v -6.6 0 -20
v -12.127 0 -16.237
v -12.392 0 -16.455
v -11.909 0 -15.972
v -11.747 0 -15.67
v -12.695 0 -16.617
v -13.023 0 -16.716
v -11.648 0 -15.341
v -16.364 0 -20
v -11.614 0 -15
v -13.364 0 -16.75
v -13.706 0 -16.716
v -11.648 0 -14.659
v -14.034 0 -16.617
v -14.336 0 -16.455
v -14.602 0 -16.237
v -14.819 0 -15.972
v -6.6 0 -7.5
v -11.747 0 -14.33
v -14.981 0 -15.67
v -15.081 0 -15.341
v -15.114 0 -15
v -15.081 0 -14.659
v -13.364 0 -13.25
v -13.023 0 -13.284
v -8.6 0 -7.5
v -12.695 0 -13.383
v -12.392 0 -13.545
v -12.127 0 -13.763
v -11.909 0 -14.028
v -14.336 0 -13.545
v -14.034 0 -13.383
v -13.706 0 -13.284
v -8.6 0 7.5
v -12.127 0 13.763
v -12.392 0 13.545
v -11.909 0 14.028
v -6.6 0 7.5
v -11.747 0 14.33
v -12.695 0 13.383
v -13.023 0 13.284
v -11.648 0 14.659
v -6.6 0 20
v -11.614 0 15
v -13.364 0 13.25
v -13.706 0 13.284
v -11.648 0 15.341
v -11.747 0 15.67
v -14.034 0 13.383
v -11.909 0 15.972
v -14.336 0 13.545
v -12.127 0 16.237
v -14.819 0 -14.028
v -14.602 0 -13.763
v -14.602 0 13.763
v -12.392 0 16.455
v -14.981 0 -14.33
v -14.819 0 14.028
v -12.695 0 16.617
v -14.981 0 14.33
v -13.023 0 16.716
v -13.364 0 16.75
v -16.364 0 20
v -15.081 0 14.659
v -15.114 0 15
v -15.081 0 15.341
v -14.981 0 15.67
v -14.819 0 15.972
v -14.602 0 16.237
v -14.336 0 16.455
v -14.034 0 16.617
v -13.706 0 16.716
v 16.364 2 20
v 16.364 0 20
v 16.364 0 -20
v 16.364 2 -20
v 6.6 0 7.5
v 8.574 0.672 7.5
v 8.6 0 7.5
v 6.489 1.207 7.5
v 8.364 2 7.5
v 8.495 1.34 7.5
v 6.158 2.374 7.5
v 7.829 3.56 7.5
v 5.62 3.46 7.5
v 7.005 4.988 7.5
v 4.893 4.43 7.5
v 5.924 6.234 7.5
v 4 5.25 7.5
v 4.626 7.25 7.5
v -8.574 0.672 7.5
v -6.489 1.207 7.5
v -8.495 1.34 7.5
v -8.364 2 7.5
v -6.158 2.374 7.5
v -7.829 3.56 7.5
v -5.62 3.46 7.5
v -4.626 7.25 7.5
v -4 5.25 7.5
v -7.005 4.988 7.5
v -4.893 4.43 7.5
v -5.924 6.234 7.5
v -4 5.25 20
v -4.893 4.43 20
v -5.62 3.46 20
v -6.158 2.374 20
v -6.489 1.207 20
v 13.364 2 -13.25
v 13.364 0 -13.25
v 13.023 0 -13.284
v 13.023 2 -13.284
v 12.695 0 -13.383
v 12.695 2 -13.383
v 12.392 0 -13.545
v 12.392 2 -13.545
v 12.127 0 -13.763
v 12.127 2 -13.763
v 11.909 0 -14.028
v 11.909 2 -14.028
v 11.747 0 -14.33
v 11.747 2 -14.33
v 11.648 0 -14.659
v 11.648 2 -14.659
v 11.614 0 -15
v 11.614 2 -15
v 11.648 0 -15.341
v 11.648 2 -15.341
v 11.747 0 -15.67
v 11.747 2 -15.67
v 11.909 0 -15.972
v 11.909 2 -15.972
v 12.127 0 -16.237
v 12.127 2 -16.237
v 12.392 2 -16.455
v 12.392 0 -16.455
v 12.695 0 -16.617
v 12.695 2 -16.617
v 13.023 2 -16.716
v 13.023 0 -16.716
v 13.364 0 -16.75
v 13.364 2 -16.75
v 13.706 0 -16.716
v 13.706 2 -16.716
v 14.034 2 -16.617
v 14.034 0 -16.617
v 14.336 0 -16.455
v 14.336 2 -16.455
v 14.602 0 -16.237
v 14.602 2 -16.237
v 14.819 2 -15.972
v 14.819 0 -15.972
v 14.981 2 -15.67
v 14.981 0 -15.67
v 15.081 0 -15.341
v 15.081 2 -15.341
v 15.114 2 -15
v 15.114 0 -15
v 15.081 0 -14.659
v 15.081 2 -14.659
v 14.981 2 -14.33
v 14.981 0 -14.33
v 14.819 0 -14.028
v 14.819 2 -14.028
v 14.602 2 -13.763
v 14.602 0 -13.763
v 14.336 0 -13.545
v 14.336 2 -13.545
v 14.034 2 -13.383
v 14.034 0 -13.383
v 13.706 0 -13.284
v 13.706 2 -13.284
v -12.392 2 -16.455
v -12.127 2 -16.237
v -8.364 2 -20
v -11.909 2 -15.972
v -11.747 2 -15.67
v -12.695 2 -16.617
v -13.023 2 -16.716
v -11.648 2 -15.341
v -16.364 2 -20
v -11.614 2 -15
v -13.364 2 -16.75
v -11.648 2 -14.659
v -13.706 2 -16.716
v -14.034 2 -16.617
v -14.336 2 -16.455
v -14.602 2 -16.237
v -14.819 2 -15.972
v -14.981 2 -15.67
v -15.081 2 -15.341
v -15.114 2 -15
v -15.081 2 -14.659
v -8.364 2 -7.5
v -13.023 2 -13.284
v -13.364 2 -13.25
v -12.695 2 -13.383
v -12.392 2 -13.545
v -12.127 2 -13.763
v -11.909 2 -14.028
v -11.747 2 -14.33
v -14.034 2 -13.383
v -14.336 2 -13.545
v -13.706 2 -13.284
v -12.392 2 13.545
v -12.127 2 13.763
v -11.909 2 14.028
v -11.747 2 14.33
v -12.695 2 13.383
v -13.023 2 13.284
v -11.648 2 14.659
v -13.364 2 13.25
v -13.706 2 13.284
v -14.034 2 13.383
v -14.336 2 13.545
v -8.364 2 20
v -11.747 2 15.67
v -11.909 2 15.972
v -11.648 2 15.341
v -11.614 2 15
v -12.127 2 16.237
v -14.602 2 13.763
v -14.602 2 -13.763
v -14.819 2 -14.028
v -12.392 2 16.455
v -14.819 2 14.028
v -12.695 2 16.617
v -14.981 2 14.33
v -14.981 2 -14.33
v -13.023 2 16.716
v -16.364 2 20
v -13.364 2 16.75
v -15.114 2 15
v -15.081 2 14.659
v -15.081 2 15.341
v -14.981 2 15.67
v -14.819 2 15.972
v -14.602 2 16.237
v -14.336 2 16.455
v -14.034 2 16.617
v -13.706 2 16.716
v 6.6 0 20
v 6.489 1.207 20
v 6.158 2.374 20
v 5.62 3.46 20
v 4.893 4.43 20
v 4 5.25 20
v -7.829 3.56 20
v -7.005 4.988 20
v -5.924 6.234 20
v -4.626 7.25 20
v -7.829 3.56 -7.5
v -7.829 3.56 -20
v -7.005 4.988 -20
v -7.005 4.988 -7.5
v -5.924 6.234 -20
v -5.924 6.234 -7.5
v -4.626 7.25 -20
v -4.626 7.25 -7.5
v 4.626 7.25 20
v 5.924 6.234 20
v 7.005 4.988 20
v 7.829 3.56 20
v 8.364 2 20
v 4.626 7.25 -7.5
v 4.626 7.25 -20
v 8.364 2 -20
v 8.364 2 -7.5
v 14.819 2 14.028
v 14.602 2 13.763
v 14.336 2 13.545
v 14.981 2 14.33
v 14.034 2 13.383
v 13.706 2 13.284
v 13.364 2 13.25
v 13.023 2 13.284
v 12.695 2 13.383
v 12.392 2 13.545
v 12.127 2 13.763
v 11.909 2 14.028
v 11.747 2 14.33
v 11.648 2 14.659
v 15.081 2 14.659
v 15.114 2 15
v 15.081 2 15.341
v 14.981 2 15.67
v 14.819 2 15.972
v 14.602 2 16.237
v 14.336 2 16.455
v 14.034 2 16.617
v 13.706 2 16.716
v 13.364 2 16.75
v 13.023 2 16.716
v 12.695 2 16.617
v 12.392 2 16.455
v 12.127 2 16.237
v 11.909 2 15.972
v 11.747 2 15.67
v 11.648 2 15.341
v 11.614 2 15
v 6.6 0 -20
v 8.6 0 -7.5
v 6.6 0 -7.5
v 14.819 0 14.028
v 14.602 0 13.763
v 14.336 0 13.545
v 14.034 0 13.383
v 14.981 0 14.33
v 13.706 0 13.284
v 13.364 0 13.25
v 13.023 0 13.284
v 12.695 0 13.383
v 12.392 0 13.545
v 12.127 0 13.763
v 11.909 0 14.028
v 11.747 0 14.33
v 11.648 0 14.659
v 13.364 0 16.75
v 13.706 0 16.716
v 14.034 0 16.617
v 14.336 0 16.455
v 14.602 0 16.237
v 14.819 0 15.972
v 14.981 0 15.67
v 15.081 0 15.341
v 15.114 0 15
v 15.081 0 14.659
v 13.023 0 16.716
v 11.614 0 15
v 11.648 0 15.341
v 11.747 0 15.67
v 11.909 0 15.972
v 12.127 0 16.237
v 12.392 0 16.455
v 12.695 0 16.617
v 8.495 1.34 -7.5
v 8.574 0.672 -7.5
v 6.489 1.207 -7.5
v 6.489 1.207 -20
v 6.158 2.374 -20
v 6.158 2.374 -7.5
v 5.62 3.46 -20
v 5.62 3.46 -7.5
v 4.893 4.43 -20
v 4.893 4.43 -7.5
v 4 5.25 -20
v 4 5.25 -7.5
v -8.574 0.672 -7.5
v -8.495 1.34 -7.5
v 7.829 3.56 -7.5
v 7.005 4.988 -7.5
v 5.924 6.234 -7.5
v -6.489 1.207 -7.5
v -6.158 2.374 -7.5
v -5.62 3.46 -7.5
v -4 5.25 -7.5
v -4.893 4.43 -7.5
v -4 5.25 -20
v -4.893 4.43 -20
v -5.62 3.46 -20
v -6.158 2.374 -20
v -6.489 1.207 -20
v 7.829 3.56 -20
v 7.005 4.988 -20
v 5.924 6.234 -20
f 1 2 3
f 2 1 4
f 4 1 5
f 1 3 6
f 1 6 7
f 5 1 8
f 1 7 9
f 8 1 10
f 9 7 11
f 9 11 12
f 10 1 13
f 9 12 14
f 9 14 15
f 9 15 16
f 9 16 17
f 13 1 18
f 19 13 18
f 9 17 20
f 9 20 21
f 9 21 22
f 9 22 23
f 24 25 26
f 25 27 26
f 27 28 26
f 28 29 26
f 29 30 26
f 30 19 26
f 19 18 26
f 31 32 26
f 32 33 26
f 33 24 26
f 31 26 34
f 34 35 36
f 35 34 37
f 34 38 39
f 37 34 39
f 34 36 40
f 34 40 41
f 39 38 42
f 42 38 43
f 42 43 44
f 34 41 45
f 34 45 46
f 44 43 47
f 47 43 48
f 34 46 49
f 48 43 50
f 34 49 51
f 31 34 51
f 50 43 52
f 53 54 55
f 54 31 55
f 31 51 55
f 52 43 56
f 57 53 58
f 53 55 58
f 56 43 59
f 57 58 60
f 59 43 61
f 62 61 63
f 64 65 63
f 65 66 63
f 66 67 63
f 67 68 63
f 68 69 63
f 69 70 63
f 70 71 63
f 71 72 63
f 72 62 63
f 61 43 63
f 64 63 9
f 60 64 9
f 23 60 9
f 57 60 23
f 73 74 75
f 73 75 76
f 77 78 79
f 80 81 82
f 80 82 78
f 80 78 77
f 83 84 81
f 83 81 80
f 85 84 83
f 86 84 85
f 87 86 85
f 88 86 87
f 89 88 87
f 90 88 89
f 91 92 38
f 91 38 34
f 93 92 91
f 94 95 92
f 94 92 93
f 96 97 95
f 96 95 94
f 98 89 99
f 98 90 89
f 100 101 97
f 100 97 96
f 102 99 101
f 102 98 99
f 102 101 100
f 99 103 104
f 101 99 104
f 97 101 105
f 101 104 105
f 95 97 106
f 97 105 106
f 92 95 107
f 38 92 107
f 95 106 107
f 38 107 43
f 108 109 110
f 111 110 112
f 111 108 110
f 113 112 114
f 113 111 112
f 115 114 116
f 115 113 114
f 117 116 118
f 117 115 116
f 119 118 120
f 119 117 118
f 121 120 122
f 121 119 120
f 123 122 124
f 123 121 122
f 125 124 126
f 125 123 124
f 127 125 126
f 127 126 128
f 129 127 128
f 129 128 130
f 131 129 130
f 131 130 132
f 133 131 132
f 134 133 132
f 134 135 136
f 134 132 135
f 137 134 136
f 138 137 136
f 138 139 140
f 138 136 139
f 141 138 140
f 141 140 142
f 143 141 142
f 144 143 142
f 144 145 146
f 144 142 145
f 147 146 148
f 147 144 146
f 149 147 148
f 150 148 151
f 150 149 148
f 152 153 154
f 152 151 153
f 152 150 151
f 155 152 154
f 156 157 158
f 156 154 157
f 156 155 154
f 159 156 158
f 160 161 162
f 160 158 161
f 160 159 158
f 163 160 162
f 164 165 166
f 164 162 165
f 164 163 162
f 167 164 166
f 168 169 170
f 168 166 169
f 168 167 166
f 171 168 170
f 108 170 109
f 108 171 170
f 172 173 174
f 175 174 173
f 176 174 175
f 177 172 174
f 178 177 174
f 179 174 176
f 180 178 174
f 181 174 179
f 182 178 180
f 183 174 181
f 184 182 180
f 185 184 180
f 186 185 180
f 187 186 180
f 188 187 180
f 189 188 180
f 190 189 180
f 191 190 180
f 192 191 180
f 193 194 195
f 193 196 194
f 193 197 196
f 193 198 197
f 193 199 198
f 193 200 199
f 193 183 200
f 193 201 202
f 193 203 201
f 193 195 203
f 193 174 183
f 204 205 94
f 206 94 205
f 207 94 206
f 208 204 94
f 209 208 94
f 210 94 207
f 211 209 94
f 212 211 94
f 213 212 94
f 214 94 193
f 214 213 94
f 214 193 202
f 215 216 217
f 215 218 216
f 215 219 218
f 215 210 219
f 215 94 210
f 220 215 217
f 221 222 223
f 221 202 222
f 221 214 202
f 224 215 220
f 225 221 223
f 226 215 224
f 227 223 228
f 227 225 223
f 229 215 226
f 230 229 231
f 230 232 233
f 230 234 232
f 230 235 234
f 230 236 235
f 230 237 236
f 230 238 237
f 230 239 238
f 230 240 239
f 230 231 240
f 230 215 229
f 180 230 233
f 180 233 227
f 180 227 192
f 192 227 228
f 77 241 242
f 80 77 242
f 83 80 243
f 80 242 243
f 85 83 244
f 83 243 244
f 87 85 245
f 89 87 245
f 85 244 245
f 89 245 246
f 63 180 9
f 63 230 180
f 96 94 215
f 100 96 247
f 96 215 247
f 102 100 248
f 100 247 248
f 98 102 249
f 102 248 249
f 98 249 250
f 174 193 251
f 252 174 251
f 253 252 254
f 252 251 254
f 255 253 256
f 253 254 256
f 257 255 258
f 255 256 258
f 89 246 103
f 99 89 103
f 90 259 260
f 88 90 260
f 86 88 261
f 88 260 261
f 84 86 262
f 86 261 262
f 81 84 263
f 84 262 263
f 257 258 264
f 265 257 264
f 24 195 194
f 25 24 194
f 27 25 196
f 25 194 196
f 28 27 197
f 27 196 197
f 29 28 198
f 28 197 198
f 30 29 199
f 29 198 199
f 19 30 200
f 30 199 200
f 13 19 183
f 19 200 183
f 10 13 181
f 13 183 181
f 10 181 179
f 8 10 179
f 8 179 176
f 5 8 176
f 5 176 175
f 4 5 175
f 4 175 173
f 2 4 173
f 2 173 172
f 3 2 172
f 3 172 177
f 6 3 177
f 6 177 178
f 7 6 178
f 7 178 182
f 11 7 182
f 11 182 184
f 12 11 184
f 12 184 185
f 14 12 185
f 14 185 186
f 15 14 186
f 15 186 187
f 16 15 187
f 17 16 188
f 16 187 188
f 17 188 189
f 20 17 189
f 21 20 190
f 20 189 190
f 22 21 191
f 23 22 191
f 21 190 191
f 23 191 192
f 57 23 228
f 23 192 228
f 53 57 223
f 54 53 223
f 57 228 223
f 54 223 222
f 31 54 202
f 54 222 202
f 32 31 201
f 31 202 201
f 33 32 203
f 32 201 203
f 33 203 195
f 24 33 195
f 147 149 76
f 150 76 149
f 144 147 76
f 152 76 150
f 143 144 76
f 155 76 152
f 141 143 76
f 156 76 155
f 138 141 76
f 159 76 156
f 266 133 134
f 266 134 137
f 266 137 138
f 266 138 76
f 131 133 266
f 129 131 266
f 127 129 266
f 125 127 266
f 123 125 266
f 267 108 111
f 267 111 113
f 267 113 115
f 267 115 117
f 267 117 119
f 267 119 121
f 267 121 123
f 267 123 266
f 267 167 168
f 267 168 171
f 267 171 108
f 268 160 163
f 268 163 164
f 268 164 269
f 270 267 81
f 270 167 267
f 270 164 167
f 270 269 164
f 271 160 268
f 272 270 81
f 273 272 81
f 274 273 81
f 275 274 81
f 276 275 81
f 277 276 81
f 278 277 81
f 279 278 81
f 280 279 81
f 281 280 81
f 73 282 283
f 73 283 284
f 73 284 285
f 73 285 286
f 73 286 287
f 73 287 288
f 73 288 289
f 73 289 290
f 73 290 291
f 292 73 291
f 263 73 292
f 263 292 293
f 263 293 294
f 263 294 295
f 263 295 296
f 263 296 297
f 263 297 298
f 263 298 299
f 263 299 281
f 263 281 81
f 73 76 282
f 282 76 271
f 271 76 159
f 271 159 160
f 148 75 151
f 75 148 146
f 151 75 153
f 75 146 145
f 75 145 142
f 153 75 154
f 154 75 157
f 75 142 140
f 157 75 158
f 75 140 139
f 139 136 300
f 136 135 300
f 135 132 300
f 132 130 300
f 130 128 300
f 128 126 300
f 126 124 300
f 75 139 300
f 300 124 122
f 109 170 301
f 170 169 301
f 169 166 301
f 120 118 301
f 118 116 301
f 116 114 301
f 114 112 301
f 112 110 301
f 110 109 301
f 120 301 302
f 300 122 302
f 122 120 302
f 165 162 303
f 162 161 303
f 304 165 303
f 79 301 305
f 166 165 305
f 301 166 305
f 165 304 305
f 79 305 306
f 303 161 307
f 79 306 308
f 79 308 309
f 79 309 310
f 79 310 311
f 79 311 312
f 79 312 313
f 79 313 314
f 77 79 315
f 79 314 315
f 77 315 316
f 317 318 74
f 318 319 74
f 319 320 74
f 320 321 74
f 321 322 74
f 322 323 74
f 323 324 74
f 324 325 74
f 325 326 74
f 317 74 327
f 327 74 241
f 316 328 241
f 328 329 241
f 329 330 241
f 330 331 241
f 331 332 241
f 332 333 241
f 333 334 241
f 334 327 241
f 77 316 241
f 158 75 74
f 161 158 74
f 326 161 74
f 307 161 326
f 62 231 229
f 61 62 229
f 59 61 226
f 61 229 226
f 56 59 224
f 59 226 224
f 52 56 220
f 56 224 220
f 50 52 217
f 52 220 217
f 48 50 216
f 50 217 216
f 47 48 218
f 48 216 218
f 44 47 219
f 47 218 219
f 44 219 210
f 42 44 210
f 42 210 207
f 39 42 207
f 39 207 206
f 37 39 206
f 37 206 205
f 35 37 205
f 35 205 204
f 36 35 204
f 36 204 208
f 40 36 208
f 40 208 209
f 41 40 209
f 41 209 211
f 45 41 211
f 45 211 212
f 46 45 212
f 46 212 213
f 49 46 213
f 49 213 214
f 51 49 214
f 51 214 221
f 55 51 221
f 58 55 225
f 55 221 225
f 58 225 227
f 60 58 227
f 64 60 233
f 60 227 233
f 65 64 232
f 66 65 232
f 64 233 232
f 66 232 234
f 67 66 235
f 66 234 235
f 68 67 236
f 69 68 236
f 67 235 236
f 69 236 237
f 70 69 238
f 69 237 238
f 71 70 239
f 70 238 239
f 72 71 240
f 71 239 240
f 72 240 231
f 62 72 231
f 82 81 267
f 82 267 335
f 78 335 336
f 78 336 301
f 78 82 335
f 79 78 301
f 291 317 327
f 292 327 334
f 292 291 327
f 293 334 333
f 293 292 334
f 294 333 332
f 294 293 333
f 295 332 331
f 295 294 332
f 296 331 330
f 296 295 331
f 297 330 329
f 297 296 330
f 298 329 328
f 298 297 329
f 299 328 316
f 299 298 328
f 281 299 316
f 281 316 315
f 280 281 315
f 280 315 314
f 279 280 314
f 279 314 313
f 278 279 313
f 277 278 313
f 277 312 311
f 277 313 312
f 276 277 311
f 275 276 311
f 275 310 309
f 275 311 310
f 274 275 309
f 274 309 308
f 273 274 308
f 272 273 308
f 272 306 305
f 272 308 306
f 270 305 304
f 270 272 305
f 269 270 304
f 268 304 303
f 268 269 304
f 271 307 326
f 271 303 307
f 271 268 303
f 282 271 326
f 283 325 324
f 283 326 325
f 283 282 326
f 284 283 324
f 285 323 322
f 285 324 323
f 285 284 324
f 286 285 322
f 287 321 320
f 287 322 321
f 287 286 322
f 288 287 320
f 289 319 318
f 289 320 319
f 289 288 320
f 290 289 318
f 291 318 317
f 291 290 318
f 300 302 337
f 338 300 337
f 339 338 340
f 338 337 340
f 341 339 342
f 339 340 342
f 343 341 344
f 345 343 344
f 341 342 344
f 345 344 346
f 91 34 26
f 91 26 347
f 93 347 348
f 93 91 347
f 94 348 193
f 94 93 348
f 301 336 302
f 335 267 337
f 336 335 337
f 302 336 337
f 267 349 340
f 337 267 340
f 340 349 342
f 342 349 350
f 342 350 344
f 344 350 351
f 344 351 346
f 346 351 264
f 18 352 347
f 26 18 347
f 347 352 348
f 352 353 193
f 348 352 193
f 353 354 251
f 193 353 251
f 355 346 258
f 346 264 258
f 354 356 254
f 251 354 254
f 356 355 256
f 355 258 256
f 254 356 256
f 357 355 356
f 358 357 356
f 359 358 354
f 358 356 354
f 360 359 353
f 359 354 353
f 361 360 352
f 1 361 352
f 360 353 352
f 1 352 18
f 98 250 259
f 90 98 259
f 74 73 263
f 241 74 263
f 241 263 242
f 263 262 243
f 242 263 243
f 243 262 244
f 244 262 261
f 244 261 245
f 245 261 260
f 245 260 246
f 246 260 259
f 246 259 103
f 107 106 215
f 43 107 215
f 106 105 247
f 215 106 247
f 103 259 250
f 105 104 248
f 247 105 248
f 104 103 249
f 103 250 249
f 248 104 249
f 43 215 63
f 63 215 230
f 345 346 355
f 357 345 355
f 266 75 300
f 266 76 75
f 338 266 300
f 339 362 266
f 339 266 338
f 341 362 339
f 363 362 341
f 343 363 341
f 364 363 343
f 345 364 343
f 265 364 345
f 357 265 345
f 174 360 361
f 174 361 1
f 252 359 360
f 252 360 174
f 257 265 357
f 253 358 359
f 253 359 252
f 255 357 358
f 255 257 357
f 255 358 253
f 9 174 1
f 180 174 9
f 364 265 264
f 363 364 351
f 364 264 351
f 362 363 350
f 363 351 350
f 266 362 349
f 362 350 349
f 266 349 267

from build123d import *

# Parameters (mm, degrees)
BOSS_EXTRUDE1_DEPTH   = 20
BOSS_EXTRUDE1_2_DEPTH = 20
BOSS_EXTRUDE2_DEPTH   = 20
CUT_EXTRUDE1_DEPTH    = 7.5
SKETCH3_R             = 1.75
CUT_EXTRUDE2_DEPTH    = 27.369487129


with BuildPart() as part:
    # Sketch2 → Boss-Extrude1 (new, symmetric)
    with BuildSketch(Plane.XY):
        with BuildLine():
            Line((-16.364209467, 0), (-8.6, 0))
            ThreePointArc((-8.6, 0), (-8.540848945, 1.006925665), (-8.364209467, 2))
            Line((-8.364209467, 2), (-16.364209467, 2))
            Line((-16.364209467, 2), (-16.364209467, 0))
        make_face()
    extrude(amount=BOSS_EXTRUDE1_DEPTH, both=True)



with BuildPart() as body_2:
    # Sketch2 → Boss-Extrude1 2 (new, symmetric)
    with BuildSketch(Plane.XY):
        with BuildLine():
            ThreePointArc((8.364209467, 2), (8.540848945, 1.006925665), (8.6, 0))
            Line((8.6, 0), (16.364209467, 0))
            Line((16.364209467, 0), (16.364209467, 2))
            Line((16.364209467, 2), (8.364209467, 2))
        make_face()
    extrude(amount=BOSS_EXTRUDE1_2_DEPTH, both=True)


with BuildPart() as part_1:
    add(part.part)

    add(body_2.part)  # Boss-Extrude2 merges body 2
    # Sketch2<4> → Boss-Extrude2 (add, symmetric)
    with BuildSketch(Plane.XY):
        with BuildLine():
            Line((-8.6, 0), (-6.6, 0))
            ThreePointArc((-6.6, 0), (-5.914302048, 2.929339736), (-3.999687488, 5.25))
            Line((-3.999687488, 5.25), (3.999687488, 5.25))
            ThreePointArc((3.999687488, 5.25), (5.914302048, 2.929339736), (6.6, 0))
            Line((6.6, 0), (8.6, 0))
            ThreePointArc((8.6, 0), (8.540848945, 1.006925665), (8.364209467, 2))
            ThreePointArc((8.364209467, 2), (7.005379537, 4.988452419), (4.625743184, 7.25))
            Line((4.625743184, 7.25), (-4.625743184, 7.25))
            ThreePointArc((-4.625743184, 7.25), (-7.005379537, 4.988452419), (-8.364209467, 2))
            ThreePointArc((-8.364209467, 2), (-8.540848945, 1.006925665), (-8.6, 0))
        make_face()
    extrude(amount=BOSS_EXTRUDE2_DEPTH, both=True)

    # Sketch2<5> → Cut-Extrude1 (cut, symmetric)
    with BuildSketch(Plane.XY):
        with BuildLine():
            Line((-8.6, 0), (-6.6, 0))
            ThreePointArc((-6.6, 0), (-5.914302048, 2.929339736), (-3.999687488, 5.25))
            Line((-3.999687488, 5.25), (3.999687488, 5.25))
            ThreePointArc((3.999687488, 5.25), (5.914302048, 2.929339736), (6.6, 0))
            Line((6.6, 0), (8.6, 0))
            ThreePointArc((8.6, 0), (8.540848945, 1.006925665), (8.364209467, 2))
            ThreePointArc((8.364209467, 2), (7.005379537, 4.988452419), (4.625743184, 7.25))
            Line((4.625743184, 7.25), (-4.625743184, 7.25))
            ThreePointArc((-4.625743184, 7.25), (-7.005379537, 4.988452419), (-8.364209467, 2))
            ThreePointArc((-8.364209467, 2), (-8.540848945, 1.006925665), (-8.6, 0))
        make_face()
    extrude(amount=CUT_EXTRUDE1_DEPTH, both=True, mode=Mode.SUBTRACT)

    # Sketch3 → Cut-Extrude2 (cut, through all)
    with BuildSketch(Plane(origin=(0, 2, 0), x_dir=(1, 0, 0), z_dir=(0, 1, 0))):
        with Locations((-13.364209467, 15)):
            Circle(SKETCH3_R)
        with Locations((-13.364209467, -15)):
            Circle(SKETCH3_R)
    cut_extrude2 = extrude(amount=-CUT_EXTRUDE2_DEPTH, mode=Mode.SUBTRACT)

    # Mirror1: Cut-Extrude2 across plane
    add(cut_extrude2.mirror(Plane(origin=(0, 0, 0), x_dir=(0, 0, 1), z_dir=(1, 0, 0))), mode=Mode.SUBTRACT)


solid = part_1.part
